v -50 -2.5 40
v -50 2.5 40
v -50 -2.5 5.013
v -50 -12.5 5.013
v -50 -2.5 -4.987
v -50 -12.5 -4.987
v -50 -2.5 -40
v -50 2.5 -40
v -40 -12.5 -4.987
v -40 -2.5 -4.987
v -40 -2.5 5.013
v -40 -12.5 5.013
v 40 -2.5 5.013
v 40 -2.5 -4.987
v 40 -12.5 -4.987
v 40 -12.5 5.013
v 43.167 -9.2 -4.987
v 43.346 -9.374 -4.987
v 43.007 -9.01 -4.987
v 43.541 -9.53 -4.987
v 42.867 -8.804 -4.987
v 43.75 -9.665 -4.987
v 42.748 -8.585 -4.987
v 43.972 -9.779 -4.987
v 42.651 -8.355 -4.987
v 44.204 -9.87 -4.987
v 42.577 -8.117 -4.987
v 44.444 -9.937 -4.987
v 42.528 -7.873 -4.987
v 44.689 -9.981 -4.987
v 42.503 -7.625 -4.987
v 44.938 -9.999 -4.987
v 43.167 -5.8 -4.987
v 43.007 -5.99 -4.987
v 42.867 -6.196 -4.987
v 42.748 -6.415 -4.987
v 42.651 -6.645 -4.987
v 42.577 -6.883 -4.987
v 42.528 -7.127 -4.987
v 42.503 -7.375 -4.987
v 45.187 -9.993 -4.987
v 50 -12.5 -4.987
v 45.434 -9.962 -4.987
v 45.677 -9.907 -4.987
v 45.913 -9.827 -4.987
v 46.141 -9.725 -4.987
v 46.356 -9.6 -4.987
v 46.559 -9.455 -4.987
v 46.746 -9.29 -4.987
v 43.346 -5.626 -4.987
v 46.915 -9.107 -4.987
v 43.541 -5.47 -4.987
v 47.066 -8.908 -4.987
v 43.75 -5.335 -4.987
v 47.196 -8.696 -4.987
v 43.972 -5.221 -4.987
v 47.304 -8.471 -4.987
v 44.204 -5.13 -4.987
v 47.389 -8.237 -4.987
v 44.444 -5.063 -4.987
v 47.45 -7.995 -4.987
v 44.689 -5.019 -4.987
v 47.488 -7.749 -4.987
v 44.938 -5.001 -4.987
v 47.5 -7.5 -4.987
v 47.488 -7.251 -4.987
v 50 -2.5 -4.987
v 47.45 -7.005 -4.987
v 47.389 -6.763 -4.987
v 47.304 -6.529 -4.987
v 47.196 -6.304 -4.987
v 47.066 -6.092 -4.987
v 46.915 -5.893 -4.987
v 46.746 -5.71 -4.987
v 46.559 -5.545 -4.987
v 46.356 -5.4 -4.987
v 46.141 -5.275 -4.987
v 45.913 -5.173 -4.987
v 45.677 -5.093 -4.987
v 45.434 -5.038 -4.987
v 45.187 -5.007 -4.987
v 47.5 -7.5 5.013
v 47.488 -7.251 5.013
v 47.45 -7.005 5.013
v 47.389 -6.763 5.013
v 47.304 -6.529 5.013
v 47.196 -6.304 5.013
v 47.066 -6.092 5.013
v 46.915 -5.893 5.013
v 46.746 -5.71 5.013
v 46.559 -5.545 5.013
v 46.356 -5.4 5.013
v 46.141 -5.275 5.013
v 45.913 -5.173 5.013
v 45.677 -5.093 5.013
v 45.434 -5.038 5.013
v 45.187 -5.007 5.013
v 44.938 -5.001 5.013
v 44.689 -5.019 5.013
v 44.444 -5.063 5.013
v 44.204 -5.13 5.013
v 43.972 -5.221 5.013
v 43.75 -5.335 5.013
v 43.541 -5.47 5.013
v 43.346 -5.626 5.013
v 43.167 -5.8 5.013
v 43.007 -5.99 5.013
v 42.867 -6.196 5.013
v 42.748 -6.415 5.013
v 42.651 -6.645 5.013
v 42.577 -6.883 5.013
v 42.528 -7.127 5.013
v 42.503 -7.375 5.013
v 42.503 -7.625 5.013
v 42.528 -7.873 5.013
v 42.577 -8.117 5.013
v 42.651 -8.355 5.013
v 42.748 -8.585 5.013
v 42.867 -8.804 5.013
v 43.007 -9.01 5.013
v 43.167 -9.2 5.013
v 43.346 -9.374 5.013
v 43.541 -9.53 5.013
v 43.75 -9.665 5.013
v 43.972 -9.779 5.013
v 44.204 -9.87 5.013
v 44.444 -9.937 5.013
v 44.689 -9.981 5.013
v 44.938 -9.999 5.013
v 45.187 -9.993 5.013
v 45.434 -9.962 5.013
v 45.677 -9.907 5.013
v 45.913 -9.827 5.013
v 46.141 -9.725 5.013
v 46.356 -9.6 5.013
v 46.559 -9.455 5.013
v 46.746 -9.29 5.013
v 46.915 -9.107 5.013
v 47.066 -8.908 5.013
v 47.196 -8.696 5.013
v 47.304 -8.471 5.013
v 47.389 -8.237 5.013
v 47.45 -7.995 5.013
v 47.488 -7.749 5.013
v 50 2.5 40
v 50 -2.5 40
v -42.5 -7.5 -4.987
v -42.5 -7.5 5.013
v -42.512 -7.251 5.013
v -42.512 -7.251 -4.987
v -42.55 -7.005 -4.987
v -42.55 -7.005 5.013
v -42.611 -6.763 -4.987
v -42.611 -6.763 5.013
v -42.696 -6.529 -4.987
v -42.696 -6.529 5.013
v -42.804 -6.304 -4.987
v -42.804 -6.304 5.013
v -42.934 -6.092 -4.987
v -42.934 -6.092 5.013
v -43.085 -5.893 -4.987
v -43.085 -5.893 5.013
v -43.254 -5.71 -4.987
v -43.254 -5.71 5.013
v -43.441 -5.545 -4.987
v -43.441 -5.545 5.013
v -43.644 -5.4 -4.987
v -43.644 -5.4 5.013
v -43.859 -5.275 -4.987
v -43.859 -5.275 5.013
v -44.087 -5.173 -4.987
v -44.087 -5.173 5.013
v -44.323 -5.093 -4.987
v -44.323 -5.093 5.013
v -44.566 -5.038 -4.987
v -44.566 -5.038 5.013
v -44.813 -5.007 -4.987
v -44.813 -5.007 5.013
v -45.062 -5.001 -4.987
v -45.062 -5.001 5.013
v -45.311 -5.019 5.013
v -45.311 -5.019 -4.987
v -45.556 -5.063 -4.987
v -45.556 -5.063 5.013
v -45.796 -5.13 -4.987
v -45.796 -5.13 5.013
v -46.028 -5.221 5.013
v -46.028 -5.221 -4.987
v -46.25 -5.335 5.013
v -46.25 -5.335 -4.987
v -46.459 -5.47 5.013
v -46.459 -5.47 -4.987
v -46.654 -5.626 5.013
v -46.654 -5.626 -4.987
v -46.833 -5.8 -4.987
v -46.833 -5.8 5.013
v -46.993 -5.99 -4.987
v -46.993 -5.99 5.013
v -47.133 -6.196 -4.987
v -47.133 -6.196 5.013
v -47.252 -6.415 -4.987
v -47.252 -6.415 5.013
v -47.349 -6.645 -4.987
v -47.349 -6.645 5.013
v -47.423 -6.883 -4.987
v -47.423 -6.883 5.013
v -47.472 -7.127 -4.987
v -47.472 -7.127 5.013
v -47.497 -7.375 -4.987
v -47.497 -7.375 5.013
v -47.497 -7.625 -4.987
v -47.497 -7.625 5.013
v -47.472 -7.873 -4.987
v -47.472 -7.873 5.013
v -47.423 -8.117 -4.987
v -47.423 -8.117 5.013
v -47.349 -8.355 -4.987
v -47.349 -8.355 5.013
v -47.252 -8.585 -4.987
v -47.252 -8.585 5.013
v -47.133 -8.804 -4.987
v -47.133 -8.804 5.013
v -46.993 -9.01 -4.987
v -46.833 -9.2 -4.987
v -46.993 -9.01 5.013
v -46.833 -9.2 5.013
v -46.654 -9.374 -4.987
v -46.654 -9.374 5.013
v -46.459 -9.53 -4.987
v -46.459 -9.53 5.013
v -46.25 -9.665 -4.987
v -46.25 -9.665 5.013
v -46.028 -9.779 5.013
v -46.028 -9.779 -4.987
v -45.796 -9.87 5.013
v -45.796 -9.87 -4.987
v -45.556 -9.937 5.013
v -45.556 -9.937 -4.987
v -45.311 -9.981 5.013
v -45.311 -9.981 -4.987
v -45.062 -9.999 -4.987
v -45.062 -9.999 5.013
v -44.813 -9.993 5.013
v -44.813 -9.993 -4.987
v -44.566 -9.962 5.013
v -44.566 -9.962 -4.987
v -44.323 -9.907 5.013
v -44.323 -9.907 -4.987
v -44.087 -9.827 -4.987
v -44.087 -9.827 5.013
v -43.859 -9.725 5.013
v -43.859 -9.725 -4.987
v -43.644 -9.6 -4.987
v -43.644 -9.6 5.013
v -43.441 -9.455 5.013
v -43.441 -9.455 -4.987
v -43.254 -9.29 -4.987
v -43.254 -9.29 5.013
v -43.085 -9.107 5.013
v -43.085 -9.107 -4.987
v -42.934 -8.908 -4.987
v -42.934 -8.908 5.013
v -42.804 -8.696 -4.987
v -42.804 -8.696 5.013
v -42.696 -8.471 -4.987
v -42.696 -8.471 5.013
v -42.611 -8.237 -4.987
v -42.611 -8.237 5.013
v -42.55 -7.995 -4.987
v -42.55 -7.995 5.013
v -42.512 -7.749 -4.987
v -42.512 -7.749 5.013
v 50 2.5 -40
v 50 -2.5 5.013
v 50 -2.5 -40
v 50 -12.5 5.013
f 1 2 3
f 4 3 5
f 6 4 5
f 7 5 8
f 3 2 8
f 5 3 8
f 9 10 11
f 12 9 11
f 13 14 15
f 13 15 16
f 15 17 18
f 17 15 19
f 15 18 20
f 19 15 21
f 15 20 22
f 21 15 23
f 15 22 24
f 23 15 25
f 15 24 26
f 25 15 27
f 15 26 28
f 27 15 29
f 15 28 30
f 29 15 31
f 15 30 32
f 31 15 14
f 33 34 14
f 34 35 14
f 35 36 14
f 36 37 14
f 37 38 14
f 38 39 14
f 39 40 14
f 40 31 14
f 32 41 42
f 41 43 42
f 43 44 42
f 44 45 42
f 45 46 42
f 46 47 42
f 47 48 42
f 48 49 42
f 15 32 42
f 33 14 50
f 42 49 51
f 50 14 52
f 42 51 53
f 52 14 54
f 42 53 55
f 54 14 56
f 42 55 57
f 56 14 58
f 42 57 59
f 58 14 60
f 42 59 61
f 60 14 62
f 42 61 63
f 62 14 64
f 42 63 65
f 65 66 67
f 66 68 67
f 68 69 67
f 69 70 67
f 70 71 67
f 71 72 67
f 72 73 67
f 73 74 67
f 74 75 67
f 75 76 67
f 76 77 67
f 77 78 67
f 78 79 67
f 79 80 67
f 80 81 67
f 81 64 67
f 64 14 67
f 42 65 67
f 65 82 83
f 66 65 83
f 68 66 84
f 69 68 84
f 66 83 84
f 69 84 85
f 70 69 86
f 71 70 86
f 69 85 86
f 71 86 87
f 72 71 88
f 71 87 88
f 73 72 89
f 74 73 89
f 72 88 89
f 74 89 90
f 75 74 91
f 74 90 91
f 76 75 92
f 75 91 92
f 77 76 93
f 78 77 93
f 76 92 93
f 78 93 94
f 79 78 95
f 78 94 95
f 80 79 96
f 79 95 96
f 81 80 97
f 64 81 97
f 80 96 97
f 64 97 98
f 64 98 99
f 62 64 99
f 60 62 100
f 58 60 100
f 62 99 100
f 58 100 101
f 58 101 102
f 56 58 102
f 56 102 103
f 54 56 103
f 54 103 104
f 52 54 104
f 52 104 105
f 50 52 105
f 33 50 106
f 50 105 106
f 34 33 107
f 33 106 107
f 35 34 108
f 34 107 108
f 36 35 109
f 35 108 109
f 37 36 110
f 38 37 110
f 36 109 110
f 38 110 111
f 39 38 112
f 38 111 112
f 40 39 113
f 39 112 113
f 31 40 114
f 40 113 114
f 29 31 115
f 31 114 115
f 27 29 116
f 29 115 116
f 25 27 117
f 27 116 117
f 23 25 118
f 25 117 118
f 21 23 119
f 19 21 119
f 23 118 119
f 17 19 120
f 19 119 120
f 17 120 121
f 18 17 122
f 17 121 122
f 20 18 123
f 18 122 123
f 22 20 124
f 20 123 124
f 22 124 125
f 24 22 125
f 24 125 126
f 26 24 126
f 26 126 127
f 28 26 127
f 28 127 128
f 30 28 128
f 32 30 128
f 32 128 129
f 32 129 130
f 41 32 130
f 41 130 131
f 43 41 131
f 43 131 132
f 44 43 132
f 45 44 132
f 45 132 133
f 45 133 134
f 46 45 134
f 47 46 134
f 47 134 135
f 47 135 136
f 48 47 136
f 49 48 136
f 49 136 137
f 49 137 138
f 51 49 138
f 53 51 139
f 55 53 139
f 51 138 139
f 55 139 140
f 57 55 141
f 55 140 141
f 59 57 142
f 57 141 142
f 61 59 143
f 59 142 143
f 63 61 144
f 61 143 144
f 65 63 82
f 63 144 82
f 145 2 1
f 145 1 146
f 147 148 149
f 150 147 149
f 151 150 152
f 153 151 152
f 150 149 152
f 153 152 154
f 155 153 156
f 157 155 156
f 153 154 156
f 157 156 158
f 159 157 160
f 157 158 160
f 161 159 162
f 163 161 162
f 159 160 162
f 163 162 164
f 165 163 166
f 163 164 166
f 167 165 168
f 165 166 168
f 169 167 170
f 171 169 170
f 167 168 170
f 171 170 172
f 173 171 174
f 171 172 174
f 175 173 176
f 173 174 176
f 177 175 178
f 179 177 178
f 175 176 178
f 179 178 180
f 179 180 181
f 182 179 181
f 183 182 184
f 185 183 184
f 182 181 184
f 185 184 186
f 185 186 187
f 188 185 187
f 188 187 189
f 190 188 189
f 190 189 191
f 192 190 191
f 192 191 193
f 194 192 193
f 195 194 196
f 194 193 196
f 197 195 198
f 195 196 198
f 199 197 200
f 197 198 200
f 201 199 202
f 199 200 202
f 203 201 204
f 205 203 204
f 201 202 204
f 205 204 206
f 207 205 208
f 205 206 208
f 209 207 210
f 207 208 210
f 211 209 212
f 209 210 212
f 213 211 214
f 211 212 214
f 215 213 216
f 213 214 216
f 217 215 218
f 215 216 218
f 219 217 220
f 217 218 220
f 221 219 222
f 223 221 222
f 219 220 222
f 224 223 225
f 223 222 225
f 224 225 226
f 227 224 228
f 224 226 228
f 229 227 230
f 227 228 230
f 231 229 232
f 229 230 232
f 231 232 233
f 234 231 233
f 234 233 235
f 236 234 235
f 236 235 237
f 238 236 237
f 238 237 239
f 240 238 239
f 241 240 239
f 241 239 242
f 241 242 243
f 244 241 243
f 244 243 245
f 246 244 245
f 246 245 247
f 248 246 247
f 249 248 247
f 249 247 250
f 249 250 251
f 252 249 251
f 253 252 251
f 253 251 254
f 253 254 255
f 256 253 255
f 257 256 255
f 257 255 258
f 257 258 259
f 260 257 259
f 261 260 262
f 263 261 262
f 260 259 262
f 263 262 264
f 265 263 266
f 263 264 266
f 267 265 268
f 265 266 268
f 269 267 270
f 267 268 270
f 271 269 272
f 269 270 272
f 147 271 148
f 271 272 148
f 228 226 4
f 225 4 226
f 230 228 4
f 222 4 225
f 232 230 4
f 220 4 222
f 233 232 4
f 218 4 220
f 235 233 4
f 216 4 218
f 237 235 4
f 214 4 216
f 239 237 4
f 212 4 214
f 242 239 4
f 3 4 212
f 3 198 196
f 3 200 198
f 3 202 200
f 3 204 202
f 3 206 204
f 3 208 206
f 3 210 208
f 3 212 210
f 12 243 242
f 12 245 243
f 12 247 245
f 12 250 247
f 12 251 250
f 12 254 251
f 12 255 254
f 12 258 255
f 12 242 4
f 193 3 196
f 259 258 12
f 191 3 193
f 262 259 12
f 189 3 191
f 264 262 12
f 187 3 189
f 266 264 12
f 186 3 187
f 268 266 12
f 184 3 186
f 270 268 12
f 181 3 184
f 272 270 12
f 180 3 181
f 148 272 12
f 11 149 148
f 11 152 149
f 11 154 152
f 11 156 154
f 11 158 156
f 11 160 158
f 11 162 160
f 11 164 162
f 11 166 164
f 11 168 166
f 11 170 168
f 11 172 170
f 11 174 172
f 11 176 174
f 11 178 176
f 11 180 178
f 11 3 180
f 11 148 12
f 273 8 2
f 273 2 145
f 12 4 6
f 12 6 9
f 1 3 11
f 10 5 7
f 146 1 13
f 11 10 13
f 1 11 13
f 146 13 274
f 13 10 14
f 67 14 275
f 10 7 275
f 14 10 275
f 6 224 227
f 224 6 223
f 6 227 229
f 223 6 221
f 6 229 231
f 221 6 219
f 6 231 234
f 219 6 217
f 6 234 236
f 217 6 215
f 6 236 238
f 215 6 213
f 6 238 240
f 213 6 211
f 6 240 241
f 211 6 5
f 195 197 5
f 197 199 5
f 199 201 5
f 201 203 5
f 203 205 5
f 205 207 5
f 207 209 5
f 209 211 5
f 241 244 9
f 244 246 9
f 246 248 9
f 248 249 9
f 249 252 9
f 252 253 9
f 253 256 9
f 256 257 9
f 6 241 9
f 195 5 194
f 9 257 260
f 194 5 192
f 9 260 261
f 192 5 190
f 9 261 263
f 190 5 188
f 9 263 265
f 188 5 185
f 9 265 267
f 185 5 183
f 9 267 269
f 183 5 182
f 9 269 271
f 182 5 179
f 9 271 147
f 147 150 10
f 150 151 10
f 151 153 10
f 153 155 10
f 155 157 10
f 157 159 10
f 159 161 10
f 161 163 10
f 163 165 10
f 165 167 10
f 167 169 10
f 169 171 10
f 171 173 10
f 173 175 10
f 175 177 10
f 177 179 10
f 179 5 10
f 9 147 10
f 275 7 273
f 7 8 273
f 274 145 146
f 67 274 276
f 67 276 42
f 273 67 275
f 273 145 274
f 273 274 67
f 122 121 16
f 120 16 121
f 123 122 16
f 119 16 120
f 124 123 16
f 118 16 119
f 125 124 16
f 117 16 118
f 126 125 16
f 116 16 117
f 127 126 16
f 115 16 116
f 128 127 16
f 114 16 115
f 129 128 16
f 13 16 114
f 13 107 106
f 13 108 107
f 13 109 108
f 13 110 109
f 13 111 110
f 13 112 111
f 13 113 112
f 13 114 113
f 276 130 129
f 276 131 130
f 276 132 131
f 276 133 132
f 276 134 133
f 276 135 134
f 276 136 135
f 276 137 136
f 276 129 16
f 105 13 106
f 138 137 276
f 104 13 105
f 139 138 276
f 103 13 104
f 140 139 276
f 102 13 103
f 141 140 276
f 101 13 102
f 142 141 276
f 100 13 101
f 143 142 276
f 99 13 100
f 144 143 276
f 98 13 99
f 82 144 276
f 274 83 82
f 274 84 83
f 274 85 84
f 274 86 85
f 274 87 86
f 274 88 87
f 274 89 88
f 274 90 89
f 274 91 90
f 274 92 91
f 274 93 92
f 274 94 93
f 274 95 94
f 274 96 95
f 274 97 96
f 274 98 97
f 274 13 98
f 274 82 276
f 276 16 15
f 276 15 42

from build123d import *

# Parameters (mm, degrees)
SKETCH1_W           = 100
SKETCH1_H           = 80
BOSS_EXTRUDE1_DEPTH = 2.5
SKETCH3_W           = 10
SKETCH3_H           = 10
BOSS_EXTRUDE2_DEPTH = 10
SKETCH6_R           = 2.5
CUT_EXTRUDE2_DEPTH  = 10


with BuildPart() as part:
    # Sketch1 → Boss-Extrude1 (new, symmetric)
    with BuildSketch(Plane(origin=(0, 0, 0), x_dir=(1, 0, 0), z_dir=(0, 1, 0))):
        Rectangle(SKETCH1_W, SKETCH1_H)
    extrude(amount=BOSS_EXTRUDE1_DEPTH, both=True)

    # Sketch3 → Boss-Extrude2 (add)
    with BuildSketch(Plane.XZ.offset(2.5)):
        with Locations((-45, 0.013089728)):
            Rectangle(SKETCH3_W, SKETCH3_H)
        with Locations((45, 0.013089728)):
            Rectangle(SKETCH3_W, SKETCH3_H)
    extrude(amount=BOSS_EXTRUDE2_DEPTH)

    # Sketch6 → Cut-Extrude2 (cut)
    with BuildSketch(Plane.XY.offset(5.013089728)):
        with Locations((-45, -7.5)):
            Circle(SKETCH6_R)
        with Locations((45, -7.5)):
            Circle(SKETCH6_R)
    extrude(amount=-CUT_EXTRUDE2_DEPTH, mode=Mode.SUBTRACT)


solid = part.part
